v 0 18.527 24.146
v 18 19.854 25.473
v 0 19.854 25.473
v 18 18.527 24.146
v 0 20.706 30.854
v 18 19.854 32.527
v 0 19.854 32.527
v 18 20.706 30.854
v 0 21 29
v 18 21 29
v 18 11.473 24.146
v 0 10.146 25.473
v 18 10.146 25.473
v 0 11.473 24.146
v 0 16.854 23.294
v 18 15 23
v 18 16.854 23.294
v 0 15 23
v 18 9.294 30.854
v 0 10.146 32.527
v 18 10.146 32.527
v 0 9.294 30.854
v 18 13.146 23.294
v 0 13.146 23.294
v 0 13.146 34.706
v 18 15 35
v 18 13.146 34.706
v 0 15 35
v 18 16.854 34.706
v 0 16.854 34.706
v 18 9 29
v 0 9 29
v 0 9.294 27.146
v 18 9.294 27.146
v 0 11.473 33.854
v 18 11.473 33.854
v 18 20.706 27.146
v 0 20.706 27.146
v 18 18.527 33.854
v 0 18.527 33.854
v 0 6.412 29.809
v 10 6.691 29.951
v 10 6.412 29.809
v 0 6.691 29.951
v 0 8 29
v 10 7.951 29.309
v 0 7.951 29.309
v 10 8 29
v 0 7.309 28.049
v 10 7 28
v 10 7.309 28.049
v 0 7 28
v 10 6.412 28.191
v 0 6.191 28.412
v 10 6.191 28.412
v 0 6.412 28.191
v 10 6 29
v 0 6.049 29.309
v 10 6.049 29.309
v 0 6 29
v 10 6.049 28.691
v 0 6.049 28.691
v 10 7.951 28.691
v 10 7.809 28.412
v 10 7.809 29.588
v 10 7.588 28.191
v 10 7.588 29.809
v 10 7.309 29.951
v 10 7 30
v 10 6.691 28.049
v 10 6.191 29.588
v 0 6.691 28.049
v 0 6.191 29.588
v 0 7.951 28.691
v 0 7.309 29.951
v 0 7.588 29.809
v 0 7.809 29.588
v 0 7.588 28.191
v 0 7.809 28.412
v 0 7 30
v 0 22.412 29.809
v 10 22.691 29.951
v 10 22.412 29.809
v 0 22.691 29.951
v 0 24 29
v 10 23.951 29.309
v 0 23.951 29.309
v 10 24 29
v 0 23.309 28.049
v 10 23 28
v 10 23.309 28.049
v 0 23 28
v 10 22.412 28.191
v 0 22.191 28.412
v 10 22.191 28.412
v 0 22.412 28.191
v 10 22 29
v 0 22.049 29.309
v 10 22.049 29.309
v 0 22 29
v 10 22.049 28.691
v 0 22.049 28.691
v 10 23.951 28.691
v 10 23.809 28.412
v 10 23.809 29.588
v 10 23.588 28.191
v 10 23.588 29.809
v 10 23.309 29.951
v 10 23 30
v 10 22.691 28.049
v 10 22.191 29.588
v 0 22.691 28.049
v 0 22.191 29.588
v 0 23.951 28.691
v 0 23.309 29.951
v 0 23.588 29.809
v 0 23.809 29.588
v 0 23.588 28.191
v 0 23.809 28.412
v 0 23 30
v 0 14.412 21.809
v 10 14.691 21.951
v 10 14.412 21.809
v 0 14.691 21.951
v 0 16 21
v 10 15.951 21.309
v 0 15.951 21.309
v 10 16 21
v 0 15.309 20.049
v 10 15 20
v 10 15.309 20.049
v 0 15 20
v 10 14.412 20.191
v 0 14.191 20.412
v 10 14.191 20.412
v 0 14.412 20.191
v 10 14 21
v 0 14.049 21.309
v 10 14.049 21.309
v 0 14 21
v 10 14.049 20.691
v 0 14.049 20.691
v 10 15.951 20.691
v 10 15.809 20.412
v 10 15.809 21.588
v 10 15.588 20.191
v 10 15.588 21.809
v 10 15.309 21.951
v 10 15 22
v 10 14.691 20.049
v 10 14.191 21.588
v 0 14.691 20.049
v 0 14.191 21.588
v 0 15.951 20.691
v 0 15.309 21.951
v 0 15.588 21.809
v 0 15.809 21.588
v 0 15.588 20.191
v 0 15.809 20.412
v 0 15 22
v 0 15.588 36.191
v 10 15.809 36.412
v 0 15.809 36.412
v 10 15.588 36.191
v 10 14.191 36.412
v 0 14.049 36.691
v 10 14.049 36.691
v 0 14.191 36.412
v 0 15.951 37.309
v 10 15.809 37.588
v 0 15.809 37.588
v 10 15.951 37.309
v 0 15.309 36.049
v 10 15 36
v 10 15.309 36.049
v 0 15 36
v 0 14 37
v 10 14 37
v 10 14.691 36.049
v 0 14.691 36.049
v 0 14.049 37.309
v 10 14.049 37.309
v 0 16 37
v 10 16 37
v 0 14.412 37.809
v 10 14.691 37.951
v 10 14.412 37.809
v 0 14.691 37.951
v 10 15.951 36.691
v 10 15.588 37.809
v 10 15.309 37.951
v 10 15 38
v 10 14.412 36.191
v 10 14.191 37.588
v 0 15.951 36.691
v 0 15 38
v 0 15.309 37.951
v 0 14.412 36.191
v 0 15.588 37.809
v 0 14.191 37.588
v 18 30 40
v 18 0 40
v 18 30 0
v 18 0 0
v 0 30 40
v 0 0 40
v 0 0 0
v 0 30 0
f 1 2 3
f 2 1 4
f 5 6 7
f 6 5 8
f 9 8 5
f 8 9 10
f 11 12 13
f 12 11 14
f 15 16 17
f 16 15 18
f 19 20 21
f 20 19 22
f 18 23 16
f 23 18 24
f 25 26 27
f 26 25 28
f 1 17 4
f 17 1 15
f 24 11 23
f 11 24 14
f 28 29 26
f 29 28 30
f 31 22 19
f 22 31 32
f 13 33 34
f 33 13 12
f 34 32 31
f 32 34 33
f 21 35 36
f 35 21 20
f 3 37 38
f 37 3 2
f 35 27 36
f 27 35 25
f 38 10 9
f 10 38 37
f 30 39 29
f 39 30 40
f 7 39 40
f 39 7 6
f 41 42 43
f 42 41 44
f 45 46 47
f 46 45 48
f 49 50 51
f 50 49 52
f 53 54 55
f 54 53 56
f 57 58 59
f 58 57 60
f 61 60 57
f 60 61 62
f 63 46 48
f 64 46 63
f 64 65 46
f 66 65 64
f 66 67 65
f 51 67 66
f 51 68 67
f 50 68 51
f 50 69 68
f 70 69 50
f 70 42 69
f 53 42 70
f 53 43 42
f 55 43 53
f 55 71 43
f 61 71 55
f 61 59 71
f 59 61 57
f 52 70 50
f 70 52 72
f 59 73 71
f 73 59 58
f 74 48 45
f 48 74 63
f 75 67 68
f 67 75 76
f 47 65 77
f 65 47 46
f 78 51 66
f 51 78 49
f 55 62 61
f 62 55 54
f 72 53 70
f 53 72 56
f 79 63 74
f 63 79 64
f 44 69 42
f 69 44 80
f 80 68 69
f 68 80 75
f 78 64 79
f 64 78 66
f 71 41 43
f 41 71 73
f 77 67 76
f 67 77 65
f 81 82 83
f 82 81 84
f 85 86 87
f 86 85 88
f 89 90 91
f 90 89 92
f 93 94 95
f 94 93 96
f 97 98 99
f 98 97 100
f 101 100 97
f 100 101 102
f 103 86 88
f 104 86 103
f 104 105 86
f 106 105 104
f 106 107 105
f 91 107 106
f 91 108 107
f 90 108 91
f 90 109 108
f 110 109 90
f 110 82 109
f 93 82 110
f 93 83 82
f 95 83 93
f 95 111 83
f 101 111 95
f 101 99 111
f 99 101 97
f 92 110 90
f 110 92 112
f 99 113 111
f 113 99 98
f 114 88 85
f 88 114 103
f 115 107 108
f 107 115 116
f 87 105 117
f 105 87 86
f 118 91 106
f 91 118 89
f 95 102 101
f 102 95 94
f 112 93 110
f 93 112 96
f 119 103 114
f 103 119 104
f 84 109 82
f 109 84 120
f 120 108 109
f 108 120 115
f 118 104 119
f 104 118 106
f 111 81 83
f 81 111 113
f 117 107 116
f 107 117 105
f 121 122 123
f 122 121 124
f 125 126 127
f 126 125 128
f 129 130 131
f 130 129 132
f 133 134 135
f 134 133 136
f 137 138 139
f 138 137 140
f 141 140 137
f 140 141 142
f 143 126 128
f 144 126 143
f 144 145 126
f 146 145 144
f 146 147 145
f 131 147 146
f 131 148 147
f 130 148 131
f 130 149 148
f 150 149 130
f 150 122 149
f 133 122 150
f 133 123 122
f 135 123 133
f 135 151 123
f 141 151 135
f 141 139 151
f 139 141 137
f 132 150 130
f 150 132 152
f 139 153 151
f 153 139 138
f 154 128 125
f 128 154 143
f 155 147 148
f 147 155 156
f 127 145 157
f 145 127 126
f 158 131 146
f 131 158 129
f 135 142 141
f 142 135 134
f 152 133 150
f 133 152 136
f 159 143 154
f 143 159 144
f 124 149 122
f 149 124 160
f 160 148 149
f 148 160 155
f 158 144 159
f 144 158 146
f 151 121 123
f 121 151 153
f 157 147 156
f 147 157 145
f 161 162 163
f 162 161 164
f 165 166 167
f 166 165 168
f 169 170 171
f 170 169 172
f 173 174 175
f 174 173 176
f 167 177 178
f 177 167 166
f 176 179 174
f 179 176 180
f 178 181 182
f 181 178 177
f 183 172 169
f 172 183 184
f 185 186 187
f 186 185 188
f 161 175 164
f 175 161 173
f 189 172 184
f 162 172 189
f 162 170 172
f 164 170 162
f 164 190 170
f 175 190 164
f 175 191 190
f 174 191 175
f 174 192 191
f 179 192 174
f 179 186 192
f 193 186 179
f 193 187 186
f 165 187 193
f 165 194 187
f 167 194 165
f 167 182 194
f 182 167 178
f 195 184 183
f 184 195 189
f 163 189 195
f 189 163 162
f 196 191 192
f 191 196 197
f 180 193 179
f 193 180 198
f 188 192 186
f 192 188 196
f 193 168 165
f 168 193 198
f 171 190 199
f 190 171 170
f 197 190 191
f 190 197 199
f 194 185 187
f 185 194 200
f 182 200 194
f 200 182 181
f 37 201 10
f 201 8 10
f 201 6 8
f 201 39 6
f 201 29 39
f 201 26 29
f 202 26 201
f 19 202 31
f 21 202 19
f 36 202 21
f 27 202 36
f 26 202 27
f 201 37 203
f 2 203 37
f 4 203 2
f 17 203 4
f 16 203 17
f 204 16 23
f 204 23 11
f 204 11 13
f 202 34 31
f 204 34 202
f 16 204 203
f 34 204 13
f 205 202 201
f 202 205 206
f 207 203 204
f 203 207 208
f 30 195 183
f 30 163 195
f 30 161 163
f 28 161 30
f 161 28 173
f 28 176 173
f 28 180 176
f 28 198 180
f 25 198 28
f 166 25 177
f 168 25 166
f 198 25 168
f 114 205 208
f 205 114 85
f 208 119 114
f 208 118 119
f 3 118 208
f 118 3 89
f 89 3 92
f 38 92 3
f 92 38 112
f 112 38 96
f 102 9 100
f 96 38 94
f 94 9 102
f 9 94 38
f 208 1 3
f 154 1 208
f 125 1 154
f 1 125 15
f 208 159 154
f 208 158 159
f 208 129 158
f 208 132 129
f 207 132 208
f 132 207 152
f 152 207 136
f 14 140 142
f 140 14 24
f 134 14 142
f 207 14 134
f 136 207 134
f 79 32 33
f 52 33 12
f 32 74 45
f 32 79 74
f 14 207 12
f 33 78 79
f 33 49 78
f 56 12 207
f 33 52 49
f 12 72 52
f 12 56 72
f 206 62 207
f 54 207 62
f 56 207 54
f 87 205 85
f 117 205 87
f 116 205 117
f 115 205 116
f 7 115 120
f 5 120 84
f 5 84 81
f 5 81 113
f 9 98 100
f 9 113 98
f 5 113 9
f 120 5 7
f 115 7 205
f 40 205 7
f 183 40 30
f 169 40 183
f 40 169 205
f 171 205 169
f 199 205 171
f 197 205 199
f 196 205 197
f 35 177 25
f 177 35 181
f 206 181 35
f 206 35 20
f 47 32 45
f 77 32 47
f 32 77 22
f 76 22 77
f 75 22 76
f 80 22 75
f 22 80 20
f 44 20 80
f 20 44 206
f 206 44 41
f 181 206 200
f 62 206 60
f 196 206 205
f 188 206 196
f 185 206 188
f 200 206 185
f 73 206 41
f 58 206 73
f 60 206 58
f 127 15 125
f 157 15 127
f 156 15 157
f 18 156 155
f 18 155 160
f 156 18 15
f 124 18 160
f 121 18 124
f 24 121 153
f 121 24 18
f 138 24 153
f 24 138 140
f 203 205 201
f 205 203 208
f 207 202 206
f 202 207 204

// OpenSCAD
$fn=20;
SD=16; /* screw distance */
SHD=2; /* screw hole diameter */
SHDP=10; /* screw hole depth */
W=18; /* width */
LSHD=12; /* lead screw hole diameter */
D=30; /* depth */
H=40; /* height */
HO=29; /* height offset bottom / mid leadscrew */

module screwHole() {
    translate([-1,D/2,0]) rotate([0,90,0]) cylinder(d=SHD, h=SHDP+1);
}

module leadScrewHoleWithScrews() {
    translate([-1,D/2,0])
        rotate([0,90,0])
        cylinder(d=LSHD, h=W+2);
    translate([0,-SD/2,0]) screwHole();
    translate([0,+SD/2,0]) screwHole();
    translate([0,0,-SD/2]) screwHole();
    translate([0,0,+SD/2]) screwHole();
}

difference() {
    cube([W,D,H]);
    translate([0,0,HO])
        leadScrewHoleWithScrews();
}
